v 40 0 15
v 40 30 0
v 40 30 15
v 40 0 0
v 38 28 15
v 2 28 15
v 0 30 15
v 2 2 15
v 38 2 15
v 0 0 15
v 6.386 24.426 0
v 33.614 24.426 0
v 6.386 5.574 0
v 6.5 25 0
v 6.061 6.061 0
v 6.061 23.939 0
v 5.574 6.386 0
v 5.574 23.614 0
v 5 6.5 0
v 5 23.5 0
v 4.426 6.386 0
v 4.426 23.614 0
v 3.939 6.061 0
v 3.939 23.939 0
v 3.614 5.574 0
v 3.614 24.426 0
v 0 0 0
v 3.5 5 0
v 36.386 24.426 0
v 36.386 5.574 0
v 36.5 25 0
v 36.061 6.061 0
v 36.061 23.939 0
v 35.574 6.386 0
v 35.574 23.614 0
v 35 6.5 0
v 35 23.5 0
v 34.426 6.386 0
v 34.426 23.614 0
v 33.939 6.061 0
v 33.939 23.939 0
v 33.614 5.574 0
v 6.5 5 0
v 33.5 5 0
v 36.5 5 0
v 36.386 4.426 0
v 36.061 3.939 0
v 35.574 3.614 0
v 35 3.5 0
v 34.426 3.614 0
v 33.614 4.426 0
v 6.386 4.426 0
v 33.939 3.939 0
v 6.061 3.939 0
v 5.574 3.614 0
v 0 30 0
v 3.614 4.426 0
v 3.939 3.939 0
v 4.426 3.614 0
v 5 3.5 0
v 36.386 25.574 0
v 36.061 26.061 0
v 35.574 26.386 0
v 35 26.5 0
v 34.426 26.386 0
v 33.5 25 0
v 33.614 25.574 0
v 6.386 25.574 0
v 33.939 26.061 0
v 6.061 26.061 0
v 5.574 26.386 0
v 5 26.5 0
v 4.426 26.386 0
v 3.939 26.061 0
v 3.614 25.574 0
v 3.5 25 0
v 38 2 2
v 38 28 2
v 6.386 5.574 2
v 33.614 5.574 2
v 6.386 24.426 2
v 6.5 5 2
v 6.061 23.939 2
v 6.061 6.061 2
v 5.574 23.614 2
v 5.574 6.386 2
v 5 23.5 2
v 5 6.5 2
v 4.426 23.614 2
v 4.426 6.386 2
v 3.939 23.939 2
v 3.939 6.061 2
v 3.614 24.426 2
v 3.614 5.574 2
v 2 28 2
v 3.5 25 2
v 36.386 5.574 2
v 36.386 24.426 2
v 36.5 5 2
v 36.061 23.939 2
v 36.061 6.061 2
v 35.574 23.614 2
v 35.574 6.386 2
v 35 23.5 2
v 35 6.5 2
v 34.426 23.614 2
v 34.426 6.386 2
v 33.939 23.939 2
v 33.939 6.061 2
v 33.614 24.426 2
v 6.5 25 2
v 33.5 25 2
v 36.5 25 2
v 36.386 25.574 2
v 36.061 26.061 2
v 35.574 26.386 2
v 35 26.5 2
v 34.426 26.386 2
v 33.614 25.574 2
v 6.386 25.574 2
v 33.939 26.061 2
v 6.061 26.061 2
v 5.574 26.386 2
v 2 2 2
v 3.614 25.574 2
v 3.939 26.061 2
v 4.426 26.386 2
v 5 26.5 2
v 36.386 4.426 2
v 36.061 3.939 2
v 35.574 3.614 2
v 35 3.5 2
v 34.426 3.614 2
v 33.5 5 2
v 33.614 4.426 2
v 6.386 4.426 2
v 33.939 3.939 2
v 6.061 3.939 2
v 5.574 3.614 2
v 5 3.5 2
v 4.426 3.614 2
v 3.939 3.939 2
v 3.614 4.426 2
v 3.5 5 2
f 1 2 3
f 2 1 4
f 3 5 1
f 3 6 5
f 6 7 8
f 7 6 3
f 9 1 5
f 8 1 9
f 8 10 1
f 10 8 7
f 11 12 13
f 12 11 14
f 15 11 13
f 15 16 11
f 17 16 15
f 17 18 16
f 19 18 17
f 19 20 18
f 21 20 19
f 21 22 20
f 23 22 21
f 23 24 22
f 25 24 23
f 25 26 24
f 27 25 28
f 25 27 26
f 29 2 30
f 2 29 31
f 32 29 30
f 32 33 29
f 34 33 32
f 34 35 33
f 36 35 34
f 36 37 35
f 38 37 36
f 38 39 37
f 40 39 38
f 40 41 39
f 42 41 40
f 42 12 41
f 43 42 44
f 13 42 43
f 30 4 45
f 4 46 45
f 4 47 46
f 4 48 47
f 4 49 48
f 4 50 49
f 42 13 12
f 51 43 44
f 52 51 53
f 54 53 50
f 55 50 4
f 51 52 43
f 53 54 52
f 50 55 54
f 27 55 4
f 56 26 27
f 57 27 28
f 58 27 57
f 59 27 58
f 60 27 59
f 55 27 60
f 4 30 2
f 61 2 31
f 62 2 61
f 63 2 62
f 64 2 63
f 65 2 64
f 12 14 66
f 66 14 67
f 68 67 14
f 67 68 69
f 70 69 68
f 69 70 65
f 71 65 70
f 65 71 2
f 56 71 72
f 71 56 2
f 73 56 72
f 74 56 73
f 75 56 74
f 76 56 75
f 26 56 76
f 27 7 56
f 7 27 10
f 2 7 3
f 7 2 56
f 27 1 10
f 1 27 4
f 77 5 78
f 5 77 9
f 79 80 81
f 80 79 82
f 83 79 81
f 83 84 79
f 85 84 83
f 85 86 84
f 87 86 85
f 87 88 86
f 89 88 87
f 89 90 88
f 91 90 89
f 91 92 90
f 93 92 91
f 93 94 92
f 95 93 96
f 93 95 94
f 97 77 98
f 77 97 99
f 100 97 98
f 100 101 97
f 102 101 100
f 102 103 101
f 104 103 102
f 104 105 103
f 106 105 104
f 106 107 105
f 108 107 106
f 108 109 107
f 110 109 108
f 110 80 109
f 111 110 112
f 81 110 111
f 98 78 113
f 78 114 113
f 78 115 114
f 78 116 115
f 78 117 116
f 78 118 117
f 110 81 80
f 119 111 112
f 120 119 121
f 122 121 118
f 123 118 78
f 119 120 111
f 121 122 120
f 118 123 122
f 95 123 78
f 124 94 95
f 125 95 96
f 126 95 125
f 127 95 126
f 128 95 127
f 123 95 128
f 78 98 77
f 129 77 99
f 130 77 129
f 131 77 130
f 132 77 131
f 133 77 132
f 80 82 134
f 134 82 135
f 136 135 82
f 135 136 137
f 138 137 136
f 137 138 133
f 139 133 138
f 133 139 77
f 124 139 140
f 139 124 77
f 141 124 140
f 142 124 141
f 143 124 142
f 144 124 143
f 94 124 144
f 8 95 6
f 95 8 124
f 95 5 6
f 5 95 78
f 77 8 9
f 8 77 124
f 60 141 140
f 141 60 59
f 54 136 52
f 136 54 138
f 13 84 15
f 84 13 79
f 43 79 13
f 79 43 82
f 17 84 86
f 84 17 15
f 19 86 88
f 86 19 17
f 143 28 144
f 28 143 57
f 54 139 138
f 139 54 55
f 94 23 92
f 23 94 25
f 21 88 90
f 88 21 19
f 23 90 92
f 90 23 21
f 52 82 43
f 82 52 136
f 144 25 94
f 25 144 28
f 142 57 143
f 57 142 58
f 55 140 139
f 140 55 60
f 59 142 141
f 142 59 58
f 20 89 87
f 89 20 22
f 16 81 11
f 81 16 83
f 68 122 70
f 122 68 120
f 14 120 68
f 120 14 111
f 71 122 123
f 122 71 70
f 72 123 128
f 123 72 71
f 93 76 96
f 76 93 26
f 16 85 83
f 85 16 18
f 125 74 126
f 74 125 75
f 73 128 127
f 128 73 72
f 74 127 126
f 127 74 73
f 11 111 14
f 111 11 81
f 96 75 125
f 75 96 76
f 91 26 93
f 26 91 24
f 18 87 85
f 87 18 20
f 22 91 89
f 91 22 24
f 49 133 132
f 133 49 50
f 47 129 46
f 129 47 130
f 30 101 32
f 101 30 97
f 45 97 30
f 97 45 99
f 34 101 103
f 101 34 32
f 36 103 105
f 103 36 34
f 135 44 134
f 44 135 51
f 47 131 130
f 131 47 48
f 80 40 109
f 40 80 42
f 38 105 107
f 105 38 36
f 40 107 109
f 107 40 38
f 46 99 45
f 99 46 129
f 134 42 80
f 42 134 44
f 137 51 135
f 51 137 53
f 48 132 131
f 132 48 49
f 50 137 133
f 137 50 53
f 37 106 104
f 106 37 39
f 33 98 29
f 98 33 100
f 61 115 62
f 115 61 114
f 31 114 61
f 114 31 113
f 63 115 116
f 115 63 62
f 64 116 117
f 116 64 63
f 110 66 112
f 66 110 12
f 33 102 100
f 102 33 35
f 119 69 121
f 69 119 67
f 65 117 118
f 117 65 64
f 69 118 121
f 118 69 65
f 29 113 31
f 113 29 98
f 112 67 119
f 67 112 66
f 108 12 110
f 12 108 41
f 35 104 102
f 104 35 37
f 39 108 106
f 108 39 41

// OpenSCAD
// Parametric box with holes.
width = 40;
depth = 30;
height = 15;
wall = 2;
hole_d = 3;
hole_inset = 5;
module box_shell() {
  difference() {
    cube([width, depth, height]);
    translate([wall, wall, wall]) cube([width - 2 * wall, depth - 2 * wall, height]);
  }
}
module holes() {
  for (x = [hole_inset, width - hole_inset], y = [hole_inset, depth - hole_inset])
    translate([x, y, -1]) cylinder(d = hole_d, h = wall + 2, $fn = 16);
}
difference() {
  box_shell();
  holes();
}
echo("box volume", width * depth * height);
